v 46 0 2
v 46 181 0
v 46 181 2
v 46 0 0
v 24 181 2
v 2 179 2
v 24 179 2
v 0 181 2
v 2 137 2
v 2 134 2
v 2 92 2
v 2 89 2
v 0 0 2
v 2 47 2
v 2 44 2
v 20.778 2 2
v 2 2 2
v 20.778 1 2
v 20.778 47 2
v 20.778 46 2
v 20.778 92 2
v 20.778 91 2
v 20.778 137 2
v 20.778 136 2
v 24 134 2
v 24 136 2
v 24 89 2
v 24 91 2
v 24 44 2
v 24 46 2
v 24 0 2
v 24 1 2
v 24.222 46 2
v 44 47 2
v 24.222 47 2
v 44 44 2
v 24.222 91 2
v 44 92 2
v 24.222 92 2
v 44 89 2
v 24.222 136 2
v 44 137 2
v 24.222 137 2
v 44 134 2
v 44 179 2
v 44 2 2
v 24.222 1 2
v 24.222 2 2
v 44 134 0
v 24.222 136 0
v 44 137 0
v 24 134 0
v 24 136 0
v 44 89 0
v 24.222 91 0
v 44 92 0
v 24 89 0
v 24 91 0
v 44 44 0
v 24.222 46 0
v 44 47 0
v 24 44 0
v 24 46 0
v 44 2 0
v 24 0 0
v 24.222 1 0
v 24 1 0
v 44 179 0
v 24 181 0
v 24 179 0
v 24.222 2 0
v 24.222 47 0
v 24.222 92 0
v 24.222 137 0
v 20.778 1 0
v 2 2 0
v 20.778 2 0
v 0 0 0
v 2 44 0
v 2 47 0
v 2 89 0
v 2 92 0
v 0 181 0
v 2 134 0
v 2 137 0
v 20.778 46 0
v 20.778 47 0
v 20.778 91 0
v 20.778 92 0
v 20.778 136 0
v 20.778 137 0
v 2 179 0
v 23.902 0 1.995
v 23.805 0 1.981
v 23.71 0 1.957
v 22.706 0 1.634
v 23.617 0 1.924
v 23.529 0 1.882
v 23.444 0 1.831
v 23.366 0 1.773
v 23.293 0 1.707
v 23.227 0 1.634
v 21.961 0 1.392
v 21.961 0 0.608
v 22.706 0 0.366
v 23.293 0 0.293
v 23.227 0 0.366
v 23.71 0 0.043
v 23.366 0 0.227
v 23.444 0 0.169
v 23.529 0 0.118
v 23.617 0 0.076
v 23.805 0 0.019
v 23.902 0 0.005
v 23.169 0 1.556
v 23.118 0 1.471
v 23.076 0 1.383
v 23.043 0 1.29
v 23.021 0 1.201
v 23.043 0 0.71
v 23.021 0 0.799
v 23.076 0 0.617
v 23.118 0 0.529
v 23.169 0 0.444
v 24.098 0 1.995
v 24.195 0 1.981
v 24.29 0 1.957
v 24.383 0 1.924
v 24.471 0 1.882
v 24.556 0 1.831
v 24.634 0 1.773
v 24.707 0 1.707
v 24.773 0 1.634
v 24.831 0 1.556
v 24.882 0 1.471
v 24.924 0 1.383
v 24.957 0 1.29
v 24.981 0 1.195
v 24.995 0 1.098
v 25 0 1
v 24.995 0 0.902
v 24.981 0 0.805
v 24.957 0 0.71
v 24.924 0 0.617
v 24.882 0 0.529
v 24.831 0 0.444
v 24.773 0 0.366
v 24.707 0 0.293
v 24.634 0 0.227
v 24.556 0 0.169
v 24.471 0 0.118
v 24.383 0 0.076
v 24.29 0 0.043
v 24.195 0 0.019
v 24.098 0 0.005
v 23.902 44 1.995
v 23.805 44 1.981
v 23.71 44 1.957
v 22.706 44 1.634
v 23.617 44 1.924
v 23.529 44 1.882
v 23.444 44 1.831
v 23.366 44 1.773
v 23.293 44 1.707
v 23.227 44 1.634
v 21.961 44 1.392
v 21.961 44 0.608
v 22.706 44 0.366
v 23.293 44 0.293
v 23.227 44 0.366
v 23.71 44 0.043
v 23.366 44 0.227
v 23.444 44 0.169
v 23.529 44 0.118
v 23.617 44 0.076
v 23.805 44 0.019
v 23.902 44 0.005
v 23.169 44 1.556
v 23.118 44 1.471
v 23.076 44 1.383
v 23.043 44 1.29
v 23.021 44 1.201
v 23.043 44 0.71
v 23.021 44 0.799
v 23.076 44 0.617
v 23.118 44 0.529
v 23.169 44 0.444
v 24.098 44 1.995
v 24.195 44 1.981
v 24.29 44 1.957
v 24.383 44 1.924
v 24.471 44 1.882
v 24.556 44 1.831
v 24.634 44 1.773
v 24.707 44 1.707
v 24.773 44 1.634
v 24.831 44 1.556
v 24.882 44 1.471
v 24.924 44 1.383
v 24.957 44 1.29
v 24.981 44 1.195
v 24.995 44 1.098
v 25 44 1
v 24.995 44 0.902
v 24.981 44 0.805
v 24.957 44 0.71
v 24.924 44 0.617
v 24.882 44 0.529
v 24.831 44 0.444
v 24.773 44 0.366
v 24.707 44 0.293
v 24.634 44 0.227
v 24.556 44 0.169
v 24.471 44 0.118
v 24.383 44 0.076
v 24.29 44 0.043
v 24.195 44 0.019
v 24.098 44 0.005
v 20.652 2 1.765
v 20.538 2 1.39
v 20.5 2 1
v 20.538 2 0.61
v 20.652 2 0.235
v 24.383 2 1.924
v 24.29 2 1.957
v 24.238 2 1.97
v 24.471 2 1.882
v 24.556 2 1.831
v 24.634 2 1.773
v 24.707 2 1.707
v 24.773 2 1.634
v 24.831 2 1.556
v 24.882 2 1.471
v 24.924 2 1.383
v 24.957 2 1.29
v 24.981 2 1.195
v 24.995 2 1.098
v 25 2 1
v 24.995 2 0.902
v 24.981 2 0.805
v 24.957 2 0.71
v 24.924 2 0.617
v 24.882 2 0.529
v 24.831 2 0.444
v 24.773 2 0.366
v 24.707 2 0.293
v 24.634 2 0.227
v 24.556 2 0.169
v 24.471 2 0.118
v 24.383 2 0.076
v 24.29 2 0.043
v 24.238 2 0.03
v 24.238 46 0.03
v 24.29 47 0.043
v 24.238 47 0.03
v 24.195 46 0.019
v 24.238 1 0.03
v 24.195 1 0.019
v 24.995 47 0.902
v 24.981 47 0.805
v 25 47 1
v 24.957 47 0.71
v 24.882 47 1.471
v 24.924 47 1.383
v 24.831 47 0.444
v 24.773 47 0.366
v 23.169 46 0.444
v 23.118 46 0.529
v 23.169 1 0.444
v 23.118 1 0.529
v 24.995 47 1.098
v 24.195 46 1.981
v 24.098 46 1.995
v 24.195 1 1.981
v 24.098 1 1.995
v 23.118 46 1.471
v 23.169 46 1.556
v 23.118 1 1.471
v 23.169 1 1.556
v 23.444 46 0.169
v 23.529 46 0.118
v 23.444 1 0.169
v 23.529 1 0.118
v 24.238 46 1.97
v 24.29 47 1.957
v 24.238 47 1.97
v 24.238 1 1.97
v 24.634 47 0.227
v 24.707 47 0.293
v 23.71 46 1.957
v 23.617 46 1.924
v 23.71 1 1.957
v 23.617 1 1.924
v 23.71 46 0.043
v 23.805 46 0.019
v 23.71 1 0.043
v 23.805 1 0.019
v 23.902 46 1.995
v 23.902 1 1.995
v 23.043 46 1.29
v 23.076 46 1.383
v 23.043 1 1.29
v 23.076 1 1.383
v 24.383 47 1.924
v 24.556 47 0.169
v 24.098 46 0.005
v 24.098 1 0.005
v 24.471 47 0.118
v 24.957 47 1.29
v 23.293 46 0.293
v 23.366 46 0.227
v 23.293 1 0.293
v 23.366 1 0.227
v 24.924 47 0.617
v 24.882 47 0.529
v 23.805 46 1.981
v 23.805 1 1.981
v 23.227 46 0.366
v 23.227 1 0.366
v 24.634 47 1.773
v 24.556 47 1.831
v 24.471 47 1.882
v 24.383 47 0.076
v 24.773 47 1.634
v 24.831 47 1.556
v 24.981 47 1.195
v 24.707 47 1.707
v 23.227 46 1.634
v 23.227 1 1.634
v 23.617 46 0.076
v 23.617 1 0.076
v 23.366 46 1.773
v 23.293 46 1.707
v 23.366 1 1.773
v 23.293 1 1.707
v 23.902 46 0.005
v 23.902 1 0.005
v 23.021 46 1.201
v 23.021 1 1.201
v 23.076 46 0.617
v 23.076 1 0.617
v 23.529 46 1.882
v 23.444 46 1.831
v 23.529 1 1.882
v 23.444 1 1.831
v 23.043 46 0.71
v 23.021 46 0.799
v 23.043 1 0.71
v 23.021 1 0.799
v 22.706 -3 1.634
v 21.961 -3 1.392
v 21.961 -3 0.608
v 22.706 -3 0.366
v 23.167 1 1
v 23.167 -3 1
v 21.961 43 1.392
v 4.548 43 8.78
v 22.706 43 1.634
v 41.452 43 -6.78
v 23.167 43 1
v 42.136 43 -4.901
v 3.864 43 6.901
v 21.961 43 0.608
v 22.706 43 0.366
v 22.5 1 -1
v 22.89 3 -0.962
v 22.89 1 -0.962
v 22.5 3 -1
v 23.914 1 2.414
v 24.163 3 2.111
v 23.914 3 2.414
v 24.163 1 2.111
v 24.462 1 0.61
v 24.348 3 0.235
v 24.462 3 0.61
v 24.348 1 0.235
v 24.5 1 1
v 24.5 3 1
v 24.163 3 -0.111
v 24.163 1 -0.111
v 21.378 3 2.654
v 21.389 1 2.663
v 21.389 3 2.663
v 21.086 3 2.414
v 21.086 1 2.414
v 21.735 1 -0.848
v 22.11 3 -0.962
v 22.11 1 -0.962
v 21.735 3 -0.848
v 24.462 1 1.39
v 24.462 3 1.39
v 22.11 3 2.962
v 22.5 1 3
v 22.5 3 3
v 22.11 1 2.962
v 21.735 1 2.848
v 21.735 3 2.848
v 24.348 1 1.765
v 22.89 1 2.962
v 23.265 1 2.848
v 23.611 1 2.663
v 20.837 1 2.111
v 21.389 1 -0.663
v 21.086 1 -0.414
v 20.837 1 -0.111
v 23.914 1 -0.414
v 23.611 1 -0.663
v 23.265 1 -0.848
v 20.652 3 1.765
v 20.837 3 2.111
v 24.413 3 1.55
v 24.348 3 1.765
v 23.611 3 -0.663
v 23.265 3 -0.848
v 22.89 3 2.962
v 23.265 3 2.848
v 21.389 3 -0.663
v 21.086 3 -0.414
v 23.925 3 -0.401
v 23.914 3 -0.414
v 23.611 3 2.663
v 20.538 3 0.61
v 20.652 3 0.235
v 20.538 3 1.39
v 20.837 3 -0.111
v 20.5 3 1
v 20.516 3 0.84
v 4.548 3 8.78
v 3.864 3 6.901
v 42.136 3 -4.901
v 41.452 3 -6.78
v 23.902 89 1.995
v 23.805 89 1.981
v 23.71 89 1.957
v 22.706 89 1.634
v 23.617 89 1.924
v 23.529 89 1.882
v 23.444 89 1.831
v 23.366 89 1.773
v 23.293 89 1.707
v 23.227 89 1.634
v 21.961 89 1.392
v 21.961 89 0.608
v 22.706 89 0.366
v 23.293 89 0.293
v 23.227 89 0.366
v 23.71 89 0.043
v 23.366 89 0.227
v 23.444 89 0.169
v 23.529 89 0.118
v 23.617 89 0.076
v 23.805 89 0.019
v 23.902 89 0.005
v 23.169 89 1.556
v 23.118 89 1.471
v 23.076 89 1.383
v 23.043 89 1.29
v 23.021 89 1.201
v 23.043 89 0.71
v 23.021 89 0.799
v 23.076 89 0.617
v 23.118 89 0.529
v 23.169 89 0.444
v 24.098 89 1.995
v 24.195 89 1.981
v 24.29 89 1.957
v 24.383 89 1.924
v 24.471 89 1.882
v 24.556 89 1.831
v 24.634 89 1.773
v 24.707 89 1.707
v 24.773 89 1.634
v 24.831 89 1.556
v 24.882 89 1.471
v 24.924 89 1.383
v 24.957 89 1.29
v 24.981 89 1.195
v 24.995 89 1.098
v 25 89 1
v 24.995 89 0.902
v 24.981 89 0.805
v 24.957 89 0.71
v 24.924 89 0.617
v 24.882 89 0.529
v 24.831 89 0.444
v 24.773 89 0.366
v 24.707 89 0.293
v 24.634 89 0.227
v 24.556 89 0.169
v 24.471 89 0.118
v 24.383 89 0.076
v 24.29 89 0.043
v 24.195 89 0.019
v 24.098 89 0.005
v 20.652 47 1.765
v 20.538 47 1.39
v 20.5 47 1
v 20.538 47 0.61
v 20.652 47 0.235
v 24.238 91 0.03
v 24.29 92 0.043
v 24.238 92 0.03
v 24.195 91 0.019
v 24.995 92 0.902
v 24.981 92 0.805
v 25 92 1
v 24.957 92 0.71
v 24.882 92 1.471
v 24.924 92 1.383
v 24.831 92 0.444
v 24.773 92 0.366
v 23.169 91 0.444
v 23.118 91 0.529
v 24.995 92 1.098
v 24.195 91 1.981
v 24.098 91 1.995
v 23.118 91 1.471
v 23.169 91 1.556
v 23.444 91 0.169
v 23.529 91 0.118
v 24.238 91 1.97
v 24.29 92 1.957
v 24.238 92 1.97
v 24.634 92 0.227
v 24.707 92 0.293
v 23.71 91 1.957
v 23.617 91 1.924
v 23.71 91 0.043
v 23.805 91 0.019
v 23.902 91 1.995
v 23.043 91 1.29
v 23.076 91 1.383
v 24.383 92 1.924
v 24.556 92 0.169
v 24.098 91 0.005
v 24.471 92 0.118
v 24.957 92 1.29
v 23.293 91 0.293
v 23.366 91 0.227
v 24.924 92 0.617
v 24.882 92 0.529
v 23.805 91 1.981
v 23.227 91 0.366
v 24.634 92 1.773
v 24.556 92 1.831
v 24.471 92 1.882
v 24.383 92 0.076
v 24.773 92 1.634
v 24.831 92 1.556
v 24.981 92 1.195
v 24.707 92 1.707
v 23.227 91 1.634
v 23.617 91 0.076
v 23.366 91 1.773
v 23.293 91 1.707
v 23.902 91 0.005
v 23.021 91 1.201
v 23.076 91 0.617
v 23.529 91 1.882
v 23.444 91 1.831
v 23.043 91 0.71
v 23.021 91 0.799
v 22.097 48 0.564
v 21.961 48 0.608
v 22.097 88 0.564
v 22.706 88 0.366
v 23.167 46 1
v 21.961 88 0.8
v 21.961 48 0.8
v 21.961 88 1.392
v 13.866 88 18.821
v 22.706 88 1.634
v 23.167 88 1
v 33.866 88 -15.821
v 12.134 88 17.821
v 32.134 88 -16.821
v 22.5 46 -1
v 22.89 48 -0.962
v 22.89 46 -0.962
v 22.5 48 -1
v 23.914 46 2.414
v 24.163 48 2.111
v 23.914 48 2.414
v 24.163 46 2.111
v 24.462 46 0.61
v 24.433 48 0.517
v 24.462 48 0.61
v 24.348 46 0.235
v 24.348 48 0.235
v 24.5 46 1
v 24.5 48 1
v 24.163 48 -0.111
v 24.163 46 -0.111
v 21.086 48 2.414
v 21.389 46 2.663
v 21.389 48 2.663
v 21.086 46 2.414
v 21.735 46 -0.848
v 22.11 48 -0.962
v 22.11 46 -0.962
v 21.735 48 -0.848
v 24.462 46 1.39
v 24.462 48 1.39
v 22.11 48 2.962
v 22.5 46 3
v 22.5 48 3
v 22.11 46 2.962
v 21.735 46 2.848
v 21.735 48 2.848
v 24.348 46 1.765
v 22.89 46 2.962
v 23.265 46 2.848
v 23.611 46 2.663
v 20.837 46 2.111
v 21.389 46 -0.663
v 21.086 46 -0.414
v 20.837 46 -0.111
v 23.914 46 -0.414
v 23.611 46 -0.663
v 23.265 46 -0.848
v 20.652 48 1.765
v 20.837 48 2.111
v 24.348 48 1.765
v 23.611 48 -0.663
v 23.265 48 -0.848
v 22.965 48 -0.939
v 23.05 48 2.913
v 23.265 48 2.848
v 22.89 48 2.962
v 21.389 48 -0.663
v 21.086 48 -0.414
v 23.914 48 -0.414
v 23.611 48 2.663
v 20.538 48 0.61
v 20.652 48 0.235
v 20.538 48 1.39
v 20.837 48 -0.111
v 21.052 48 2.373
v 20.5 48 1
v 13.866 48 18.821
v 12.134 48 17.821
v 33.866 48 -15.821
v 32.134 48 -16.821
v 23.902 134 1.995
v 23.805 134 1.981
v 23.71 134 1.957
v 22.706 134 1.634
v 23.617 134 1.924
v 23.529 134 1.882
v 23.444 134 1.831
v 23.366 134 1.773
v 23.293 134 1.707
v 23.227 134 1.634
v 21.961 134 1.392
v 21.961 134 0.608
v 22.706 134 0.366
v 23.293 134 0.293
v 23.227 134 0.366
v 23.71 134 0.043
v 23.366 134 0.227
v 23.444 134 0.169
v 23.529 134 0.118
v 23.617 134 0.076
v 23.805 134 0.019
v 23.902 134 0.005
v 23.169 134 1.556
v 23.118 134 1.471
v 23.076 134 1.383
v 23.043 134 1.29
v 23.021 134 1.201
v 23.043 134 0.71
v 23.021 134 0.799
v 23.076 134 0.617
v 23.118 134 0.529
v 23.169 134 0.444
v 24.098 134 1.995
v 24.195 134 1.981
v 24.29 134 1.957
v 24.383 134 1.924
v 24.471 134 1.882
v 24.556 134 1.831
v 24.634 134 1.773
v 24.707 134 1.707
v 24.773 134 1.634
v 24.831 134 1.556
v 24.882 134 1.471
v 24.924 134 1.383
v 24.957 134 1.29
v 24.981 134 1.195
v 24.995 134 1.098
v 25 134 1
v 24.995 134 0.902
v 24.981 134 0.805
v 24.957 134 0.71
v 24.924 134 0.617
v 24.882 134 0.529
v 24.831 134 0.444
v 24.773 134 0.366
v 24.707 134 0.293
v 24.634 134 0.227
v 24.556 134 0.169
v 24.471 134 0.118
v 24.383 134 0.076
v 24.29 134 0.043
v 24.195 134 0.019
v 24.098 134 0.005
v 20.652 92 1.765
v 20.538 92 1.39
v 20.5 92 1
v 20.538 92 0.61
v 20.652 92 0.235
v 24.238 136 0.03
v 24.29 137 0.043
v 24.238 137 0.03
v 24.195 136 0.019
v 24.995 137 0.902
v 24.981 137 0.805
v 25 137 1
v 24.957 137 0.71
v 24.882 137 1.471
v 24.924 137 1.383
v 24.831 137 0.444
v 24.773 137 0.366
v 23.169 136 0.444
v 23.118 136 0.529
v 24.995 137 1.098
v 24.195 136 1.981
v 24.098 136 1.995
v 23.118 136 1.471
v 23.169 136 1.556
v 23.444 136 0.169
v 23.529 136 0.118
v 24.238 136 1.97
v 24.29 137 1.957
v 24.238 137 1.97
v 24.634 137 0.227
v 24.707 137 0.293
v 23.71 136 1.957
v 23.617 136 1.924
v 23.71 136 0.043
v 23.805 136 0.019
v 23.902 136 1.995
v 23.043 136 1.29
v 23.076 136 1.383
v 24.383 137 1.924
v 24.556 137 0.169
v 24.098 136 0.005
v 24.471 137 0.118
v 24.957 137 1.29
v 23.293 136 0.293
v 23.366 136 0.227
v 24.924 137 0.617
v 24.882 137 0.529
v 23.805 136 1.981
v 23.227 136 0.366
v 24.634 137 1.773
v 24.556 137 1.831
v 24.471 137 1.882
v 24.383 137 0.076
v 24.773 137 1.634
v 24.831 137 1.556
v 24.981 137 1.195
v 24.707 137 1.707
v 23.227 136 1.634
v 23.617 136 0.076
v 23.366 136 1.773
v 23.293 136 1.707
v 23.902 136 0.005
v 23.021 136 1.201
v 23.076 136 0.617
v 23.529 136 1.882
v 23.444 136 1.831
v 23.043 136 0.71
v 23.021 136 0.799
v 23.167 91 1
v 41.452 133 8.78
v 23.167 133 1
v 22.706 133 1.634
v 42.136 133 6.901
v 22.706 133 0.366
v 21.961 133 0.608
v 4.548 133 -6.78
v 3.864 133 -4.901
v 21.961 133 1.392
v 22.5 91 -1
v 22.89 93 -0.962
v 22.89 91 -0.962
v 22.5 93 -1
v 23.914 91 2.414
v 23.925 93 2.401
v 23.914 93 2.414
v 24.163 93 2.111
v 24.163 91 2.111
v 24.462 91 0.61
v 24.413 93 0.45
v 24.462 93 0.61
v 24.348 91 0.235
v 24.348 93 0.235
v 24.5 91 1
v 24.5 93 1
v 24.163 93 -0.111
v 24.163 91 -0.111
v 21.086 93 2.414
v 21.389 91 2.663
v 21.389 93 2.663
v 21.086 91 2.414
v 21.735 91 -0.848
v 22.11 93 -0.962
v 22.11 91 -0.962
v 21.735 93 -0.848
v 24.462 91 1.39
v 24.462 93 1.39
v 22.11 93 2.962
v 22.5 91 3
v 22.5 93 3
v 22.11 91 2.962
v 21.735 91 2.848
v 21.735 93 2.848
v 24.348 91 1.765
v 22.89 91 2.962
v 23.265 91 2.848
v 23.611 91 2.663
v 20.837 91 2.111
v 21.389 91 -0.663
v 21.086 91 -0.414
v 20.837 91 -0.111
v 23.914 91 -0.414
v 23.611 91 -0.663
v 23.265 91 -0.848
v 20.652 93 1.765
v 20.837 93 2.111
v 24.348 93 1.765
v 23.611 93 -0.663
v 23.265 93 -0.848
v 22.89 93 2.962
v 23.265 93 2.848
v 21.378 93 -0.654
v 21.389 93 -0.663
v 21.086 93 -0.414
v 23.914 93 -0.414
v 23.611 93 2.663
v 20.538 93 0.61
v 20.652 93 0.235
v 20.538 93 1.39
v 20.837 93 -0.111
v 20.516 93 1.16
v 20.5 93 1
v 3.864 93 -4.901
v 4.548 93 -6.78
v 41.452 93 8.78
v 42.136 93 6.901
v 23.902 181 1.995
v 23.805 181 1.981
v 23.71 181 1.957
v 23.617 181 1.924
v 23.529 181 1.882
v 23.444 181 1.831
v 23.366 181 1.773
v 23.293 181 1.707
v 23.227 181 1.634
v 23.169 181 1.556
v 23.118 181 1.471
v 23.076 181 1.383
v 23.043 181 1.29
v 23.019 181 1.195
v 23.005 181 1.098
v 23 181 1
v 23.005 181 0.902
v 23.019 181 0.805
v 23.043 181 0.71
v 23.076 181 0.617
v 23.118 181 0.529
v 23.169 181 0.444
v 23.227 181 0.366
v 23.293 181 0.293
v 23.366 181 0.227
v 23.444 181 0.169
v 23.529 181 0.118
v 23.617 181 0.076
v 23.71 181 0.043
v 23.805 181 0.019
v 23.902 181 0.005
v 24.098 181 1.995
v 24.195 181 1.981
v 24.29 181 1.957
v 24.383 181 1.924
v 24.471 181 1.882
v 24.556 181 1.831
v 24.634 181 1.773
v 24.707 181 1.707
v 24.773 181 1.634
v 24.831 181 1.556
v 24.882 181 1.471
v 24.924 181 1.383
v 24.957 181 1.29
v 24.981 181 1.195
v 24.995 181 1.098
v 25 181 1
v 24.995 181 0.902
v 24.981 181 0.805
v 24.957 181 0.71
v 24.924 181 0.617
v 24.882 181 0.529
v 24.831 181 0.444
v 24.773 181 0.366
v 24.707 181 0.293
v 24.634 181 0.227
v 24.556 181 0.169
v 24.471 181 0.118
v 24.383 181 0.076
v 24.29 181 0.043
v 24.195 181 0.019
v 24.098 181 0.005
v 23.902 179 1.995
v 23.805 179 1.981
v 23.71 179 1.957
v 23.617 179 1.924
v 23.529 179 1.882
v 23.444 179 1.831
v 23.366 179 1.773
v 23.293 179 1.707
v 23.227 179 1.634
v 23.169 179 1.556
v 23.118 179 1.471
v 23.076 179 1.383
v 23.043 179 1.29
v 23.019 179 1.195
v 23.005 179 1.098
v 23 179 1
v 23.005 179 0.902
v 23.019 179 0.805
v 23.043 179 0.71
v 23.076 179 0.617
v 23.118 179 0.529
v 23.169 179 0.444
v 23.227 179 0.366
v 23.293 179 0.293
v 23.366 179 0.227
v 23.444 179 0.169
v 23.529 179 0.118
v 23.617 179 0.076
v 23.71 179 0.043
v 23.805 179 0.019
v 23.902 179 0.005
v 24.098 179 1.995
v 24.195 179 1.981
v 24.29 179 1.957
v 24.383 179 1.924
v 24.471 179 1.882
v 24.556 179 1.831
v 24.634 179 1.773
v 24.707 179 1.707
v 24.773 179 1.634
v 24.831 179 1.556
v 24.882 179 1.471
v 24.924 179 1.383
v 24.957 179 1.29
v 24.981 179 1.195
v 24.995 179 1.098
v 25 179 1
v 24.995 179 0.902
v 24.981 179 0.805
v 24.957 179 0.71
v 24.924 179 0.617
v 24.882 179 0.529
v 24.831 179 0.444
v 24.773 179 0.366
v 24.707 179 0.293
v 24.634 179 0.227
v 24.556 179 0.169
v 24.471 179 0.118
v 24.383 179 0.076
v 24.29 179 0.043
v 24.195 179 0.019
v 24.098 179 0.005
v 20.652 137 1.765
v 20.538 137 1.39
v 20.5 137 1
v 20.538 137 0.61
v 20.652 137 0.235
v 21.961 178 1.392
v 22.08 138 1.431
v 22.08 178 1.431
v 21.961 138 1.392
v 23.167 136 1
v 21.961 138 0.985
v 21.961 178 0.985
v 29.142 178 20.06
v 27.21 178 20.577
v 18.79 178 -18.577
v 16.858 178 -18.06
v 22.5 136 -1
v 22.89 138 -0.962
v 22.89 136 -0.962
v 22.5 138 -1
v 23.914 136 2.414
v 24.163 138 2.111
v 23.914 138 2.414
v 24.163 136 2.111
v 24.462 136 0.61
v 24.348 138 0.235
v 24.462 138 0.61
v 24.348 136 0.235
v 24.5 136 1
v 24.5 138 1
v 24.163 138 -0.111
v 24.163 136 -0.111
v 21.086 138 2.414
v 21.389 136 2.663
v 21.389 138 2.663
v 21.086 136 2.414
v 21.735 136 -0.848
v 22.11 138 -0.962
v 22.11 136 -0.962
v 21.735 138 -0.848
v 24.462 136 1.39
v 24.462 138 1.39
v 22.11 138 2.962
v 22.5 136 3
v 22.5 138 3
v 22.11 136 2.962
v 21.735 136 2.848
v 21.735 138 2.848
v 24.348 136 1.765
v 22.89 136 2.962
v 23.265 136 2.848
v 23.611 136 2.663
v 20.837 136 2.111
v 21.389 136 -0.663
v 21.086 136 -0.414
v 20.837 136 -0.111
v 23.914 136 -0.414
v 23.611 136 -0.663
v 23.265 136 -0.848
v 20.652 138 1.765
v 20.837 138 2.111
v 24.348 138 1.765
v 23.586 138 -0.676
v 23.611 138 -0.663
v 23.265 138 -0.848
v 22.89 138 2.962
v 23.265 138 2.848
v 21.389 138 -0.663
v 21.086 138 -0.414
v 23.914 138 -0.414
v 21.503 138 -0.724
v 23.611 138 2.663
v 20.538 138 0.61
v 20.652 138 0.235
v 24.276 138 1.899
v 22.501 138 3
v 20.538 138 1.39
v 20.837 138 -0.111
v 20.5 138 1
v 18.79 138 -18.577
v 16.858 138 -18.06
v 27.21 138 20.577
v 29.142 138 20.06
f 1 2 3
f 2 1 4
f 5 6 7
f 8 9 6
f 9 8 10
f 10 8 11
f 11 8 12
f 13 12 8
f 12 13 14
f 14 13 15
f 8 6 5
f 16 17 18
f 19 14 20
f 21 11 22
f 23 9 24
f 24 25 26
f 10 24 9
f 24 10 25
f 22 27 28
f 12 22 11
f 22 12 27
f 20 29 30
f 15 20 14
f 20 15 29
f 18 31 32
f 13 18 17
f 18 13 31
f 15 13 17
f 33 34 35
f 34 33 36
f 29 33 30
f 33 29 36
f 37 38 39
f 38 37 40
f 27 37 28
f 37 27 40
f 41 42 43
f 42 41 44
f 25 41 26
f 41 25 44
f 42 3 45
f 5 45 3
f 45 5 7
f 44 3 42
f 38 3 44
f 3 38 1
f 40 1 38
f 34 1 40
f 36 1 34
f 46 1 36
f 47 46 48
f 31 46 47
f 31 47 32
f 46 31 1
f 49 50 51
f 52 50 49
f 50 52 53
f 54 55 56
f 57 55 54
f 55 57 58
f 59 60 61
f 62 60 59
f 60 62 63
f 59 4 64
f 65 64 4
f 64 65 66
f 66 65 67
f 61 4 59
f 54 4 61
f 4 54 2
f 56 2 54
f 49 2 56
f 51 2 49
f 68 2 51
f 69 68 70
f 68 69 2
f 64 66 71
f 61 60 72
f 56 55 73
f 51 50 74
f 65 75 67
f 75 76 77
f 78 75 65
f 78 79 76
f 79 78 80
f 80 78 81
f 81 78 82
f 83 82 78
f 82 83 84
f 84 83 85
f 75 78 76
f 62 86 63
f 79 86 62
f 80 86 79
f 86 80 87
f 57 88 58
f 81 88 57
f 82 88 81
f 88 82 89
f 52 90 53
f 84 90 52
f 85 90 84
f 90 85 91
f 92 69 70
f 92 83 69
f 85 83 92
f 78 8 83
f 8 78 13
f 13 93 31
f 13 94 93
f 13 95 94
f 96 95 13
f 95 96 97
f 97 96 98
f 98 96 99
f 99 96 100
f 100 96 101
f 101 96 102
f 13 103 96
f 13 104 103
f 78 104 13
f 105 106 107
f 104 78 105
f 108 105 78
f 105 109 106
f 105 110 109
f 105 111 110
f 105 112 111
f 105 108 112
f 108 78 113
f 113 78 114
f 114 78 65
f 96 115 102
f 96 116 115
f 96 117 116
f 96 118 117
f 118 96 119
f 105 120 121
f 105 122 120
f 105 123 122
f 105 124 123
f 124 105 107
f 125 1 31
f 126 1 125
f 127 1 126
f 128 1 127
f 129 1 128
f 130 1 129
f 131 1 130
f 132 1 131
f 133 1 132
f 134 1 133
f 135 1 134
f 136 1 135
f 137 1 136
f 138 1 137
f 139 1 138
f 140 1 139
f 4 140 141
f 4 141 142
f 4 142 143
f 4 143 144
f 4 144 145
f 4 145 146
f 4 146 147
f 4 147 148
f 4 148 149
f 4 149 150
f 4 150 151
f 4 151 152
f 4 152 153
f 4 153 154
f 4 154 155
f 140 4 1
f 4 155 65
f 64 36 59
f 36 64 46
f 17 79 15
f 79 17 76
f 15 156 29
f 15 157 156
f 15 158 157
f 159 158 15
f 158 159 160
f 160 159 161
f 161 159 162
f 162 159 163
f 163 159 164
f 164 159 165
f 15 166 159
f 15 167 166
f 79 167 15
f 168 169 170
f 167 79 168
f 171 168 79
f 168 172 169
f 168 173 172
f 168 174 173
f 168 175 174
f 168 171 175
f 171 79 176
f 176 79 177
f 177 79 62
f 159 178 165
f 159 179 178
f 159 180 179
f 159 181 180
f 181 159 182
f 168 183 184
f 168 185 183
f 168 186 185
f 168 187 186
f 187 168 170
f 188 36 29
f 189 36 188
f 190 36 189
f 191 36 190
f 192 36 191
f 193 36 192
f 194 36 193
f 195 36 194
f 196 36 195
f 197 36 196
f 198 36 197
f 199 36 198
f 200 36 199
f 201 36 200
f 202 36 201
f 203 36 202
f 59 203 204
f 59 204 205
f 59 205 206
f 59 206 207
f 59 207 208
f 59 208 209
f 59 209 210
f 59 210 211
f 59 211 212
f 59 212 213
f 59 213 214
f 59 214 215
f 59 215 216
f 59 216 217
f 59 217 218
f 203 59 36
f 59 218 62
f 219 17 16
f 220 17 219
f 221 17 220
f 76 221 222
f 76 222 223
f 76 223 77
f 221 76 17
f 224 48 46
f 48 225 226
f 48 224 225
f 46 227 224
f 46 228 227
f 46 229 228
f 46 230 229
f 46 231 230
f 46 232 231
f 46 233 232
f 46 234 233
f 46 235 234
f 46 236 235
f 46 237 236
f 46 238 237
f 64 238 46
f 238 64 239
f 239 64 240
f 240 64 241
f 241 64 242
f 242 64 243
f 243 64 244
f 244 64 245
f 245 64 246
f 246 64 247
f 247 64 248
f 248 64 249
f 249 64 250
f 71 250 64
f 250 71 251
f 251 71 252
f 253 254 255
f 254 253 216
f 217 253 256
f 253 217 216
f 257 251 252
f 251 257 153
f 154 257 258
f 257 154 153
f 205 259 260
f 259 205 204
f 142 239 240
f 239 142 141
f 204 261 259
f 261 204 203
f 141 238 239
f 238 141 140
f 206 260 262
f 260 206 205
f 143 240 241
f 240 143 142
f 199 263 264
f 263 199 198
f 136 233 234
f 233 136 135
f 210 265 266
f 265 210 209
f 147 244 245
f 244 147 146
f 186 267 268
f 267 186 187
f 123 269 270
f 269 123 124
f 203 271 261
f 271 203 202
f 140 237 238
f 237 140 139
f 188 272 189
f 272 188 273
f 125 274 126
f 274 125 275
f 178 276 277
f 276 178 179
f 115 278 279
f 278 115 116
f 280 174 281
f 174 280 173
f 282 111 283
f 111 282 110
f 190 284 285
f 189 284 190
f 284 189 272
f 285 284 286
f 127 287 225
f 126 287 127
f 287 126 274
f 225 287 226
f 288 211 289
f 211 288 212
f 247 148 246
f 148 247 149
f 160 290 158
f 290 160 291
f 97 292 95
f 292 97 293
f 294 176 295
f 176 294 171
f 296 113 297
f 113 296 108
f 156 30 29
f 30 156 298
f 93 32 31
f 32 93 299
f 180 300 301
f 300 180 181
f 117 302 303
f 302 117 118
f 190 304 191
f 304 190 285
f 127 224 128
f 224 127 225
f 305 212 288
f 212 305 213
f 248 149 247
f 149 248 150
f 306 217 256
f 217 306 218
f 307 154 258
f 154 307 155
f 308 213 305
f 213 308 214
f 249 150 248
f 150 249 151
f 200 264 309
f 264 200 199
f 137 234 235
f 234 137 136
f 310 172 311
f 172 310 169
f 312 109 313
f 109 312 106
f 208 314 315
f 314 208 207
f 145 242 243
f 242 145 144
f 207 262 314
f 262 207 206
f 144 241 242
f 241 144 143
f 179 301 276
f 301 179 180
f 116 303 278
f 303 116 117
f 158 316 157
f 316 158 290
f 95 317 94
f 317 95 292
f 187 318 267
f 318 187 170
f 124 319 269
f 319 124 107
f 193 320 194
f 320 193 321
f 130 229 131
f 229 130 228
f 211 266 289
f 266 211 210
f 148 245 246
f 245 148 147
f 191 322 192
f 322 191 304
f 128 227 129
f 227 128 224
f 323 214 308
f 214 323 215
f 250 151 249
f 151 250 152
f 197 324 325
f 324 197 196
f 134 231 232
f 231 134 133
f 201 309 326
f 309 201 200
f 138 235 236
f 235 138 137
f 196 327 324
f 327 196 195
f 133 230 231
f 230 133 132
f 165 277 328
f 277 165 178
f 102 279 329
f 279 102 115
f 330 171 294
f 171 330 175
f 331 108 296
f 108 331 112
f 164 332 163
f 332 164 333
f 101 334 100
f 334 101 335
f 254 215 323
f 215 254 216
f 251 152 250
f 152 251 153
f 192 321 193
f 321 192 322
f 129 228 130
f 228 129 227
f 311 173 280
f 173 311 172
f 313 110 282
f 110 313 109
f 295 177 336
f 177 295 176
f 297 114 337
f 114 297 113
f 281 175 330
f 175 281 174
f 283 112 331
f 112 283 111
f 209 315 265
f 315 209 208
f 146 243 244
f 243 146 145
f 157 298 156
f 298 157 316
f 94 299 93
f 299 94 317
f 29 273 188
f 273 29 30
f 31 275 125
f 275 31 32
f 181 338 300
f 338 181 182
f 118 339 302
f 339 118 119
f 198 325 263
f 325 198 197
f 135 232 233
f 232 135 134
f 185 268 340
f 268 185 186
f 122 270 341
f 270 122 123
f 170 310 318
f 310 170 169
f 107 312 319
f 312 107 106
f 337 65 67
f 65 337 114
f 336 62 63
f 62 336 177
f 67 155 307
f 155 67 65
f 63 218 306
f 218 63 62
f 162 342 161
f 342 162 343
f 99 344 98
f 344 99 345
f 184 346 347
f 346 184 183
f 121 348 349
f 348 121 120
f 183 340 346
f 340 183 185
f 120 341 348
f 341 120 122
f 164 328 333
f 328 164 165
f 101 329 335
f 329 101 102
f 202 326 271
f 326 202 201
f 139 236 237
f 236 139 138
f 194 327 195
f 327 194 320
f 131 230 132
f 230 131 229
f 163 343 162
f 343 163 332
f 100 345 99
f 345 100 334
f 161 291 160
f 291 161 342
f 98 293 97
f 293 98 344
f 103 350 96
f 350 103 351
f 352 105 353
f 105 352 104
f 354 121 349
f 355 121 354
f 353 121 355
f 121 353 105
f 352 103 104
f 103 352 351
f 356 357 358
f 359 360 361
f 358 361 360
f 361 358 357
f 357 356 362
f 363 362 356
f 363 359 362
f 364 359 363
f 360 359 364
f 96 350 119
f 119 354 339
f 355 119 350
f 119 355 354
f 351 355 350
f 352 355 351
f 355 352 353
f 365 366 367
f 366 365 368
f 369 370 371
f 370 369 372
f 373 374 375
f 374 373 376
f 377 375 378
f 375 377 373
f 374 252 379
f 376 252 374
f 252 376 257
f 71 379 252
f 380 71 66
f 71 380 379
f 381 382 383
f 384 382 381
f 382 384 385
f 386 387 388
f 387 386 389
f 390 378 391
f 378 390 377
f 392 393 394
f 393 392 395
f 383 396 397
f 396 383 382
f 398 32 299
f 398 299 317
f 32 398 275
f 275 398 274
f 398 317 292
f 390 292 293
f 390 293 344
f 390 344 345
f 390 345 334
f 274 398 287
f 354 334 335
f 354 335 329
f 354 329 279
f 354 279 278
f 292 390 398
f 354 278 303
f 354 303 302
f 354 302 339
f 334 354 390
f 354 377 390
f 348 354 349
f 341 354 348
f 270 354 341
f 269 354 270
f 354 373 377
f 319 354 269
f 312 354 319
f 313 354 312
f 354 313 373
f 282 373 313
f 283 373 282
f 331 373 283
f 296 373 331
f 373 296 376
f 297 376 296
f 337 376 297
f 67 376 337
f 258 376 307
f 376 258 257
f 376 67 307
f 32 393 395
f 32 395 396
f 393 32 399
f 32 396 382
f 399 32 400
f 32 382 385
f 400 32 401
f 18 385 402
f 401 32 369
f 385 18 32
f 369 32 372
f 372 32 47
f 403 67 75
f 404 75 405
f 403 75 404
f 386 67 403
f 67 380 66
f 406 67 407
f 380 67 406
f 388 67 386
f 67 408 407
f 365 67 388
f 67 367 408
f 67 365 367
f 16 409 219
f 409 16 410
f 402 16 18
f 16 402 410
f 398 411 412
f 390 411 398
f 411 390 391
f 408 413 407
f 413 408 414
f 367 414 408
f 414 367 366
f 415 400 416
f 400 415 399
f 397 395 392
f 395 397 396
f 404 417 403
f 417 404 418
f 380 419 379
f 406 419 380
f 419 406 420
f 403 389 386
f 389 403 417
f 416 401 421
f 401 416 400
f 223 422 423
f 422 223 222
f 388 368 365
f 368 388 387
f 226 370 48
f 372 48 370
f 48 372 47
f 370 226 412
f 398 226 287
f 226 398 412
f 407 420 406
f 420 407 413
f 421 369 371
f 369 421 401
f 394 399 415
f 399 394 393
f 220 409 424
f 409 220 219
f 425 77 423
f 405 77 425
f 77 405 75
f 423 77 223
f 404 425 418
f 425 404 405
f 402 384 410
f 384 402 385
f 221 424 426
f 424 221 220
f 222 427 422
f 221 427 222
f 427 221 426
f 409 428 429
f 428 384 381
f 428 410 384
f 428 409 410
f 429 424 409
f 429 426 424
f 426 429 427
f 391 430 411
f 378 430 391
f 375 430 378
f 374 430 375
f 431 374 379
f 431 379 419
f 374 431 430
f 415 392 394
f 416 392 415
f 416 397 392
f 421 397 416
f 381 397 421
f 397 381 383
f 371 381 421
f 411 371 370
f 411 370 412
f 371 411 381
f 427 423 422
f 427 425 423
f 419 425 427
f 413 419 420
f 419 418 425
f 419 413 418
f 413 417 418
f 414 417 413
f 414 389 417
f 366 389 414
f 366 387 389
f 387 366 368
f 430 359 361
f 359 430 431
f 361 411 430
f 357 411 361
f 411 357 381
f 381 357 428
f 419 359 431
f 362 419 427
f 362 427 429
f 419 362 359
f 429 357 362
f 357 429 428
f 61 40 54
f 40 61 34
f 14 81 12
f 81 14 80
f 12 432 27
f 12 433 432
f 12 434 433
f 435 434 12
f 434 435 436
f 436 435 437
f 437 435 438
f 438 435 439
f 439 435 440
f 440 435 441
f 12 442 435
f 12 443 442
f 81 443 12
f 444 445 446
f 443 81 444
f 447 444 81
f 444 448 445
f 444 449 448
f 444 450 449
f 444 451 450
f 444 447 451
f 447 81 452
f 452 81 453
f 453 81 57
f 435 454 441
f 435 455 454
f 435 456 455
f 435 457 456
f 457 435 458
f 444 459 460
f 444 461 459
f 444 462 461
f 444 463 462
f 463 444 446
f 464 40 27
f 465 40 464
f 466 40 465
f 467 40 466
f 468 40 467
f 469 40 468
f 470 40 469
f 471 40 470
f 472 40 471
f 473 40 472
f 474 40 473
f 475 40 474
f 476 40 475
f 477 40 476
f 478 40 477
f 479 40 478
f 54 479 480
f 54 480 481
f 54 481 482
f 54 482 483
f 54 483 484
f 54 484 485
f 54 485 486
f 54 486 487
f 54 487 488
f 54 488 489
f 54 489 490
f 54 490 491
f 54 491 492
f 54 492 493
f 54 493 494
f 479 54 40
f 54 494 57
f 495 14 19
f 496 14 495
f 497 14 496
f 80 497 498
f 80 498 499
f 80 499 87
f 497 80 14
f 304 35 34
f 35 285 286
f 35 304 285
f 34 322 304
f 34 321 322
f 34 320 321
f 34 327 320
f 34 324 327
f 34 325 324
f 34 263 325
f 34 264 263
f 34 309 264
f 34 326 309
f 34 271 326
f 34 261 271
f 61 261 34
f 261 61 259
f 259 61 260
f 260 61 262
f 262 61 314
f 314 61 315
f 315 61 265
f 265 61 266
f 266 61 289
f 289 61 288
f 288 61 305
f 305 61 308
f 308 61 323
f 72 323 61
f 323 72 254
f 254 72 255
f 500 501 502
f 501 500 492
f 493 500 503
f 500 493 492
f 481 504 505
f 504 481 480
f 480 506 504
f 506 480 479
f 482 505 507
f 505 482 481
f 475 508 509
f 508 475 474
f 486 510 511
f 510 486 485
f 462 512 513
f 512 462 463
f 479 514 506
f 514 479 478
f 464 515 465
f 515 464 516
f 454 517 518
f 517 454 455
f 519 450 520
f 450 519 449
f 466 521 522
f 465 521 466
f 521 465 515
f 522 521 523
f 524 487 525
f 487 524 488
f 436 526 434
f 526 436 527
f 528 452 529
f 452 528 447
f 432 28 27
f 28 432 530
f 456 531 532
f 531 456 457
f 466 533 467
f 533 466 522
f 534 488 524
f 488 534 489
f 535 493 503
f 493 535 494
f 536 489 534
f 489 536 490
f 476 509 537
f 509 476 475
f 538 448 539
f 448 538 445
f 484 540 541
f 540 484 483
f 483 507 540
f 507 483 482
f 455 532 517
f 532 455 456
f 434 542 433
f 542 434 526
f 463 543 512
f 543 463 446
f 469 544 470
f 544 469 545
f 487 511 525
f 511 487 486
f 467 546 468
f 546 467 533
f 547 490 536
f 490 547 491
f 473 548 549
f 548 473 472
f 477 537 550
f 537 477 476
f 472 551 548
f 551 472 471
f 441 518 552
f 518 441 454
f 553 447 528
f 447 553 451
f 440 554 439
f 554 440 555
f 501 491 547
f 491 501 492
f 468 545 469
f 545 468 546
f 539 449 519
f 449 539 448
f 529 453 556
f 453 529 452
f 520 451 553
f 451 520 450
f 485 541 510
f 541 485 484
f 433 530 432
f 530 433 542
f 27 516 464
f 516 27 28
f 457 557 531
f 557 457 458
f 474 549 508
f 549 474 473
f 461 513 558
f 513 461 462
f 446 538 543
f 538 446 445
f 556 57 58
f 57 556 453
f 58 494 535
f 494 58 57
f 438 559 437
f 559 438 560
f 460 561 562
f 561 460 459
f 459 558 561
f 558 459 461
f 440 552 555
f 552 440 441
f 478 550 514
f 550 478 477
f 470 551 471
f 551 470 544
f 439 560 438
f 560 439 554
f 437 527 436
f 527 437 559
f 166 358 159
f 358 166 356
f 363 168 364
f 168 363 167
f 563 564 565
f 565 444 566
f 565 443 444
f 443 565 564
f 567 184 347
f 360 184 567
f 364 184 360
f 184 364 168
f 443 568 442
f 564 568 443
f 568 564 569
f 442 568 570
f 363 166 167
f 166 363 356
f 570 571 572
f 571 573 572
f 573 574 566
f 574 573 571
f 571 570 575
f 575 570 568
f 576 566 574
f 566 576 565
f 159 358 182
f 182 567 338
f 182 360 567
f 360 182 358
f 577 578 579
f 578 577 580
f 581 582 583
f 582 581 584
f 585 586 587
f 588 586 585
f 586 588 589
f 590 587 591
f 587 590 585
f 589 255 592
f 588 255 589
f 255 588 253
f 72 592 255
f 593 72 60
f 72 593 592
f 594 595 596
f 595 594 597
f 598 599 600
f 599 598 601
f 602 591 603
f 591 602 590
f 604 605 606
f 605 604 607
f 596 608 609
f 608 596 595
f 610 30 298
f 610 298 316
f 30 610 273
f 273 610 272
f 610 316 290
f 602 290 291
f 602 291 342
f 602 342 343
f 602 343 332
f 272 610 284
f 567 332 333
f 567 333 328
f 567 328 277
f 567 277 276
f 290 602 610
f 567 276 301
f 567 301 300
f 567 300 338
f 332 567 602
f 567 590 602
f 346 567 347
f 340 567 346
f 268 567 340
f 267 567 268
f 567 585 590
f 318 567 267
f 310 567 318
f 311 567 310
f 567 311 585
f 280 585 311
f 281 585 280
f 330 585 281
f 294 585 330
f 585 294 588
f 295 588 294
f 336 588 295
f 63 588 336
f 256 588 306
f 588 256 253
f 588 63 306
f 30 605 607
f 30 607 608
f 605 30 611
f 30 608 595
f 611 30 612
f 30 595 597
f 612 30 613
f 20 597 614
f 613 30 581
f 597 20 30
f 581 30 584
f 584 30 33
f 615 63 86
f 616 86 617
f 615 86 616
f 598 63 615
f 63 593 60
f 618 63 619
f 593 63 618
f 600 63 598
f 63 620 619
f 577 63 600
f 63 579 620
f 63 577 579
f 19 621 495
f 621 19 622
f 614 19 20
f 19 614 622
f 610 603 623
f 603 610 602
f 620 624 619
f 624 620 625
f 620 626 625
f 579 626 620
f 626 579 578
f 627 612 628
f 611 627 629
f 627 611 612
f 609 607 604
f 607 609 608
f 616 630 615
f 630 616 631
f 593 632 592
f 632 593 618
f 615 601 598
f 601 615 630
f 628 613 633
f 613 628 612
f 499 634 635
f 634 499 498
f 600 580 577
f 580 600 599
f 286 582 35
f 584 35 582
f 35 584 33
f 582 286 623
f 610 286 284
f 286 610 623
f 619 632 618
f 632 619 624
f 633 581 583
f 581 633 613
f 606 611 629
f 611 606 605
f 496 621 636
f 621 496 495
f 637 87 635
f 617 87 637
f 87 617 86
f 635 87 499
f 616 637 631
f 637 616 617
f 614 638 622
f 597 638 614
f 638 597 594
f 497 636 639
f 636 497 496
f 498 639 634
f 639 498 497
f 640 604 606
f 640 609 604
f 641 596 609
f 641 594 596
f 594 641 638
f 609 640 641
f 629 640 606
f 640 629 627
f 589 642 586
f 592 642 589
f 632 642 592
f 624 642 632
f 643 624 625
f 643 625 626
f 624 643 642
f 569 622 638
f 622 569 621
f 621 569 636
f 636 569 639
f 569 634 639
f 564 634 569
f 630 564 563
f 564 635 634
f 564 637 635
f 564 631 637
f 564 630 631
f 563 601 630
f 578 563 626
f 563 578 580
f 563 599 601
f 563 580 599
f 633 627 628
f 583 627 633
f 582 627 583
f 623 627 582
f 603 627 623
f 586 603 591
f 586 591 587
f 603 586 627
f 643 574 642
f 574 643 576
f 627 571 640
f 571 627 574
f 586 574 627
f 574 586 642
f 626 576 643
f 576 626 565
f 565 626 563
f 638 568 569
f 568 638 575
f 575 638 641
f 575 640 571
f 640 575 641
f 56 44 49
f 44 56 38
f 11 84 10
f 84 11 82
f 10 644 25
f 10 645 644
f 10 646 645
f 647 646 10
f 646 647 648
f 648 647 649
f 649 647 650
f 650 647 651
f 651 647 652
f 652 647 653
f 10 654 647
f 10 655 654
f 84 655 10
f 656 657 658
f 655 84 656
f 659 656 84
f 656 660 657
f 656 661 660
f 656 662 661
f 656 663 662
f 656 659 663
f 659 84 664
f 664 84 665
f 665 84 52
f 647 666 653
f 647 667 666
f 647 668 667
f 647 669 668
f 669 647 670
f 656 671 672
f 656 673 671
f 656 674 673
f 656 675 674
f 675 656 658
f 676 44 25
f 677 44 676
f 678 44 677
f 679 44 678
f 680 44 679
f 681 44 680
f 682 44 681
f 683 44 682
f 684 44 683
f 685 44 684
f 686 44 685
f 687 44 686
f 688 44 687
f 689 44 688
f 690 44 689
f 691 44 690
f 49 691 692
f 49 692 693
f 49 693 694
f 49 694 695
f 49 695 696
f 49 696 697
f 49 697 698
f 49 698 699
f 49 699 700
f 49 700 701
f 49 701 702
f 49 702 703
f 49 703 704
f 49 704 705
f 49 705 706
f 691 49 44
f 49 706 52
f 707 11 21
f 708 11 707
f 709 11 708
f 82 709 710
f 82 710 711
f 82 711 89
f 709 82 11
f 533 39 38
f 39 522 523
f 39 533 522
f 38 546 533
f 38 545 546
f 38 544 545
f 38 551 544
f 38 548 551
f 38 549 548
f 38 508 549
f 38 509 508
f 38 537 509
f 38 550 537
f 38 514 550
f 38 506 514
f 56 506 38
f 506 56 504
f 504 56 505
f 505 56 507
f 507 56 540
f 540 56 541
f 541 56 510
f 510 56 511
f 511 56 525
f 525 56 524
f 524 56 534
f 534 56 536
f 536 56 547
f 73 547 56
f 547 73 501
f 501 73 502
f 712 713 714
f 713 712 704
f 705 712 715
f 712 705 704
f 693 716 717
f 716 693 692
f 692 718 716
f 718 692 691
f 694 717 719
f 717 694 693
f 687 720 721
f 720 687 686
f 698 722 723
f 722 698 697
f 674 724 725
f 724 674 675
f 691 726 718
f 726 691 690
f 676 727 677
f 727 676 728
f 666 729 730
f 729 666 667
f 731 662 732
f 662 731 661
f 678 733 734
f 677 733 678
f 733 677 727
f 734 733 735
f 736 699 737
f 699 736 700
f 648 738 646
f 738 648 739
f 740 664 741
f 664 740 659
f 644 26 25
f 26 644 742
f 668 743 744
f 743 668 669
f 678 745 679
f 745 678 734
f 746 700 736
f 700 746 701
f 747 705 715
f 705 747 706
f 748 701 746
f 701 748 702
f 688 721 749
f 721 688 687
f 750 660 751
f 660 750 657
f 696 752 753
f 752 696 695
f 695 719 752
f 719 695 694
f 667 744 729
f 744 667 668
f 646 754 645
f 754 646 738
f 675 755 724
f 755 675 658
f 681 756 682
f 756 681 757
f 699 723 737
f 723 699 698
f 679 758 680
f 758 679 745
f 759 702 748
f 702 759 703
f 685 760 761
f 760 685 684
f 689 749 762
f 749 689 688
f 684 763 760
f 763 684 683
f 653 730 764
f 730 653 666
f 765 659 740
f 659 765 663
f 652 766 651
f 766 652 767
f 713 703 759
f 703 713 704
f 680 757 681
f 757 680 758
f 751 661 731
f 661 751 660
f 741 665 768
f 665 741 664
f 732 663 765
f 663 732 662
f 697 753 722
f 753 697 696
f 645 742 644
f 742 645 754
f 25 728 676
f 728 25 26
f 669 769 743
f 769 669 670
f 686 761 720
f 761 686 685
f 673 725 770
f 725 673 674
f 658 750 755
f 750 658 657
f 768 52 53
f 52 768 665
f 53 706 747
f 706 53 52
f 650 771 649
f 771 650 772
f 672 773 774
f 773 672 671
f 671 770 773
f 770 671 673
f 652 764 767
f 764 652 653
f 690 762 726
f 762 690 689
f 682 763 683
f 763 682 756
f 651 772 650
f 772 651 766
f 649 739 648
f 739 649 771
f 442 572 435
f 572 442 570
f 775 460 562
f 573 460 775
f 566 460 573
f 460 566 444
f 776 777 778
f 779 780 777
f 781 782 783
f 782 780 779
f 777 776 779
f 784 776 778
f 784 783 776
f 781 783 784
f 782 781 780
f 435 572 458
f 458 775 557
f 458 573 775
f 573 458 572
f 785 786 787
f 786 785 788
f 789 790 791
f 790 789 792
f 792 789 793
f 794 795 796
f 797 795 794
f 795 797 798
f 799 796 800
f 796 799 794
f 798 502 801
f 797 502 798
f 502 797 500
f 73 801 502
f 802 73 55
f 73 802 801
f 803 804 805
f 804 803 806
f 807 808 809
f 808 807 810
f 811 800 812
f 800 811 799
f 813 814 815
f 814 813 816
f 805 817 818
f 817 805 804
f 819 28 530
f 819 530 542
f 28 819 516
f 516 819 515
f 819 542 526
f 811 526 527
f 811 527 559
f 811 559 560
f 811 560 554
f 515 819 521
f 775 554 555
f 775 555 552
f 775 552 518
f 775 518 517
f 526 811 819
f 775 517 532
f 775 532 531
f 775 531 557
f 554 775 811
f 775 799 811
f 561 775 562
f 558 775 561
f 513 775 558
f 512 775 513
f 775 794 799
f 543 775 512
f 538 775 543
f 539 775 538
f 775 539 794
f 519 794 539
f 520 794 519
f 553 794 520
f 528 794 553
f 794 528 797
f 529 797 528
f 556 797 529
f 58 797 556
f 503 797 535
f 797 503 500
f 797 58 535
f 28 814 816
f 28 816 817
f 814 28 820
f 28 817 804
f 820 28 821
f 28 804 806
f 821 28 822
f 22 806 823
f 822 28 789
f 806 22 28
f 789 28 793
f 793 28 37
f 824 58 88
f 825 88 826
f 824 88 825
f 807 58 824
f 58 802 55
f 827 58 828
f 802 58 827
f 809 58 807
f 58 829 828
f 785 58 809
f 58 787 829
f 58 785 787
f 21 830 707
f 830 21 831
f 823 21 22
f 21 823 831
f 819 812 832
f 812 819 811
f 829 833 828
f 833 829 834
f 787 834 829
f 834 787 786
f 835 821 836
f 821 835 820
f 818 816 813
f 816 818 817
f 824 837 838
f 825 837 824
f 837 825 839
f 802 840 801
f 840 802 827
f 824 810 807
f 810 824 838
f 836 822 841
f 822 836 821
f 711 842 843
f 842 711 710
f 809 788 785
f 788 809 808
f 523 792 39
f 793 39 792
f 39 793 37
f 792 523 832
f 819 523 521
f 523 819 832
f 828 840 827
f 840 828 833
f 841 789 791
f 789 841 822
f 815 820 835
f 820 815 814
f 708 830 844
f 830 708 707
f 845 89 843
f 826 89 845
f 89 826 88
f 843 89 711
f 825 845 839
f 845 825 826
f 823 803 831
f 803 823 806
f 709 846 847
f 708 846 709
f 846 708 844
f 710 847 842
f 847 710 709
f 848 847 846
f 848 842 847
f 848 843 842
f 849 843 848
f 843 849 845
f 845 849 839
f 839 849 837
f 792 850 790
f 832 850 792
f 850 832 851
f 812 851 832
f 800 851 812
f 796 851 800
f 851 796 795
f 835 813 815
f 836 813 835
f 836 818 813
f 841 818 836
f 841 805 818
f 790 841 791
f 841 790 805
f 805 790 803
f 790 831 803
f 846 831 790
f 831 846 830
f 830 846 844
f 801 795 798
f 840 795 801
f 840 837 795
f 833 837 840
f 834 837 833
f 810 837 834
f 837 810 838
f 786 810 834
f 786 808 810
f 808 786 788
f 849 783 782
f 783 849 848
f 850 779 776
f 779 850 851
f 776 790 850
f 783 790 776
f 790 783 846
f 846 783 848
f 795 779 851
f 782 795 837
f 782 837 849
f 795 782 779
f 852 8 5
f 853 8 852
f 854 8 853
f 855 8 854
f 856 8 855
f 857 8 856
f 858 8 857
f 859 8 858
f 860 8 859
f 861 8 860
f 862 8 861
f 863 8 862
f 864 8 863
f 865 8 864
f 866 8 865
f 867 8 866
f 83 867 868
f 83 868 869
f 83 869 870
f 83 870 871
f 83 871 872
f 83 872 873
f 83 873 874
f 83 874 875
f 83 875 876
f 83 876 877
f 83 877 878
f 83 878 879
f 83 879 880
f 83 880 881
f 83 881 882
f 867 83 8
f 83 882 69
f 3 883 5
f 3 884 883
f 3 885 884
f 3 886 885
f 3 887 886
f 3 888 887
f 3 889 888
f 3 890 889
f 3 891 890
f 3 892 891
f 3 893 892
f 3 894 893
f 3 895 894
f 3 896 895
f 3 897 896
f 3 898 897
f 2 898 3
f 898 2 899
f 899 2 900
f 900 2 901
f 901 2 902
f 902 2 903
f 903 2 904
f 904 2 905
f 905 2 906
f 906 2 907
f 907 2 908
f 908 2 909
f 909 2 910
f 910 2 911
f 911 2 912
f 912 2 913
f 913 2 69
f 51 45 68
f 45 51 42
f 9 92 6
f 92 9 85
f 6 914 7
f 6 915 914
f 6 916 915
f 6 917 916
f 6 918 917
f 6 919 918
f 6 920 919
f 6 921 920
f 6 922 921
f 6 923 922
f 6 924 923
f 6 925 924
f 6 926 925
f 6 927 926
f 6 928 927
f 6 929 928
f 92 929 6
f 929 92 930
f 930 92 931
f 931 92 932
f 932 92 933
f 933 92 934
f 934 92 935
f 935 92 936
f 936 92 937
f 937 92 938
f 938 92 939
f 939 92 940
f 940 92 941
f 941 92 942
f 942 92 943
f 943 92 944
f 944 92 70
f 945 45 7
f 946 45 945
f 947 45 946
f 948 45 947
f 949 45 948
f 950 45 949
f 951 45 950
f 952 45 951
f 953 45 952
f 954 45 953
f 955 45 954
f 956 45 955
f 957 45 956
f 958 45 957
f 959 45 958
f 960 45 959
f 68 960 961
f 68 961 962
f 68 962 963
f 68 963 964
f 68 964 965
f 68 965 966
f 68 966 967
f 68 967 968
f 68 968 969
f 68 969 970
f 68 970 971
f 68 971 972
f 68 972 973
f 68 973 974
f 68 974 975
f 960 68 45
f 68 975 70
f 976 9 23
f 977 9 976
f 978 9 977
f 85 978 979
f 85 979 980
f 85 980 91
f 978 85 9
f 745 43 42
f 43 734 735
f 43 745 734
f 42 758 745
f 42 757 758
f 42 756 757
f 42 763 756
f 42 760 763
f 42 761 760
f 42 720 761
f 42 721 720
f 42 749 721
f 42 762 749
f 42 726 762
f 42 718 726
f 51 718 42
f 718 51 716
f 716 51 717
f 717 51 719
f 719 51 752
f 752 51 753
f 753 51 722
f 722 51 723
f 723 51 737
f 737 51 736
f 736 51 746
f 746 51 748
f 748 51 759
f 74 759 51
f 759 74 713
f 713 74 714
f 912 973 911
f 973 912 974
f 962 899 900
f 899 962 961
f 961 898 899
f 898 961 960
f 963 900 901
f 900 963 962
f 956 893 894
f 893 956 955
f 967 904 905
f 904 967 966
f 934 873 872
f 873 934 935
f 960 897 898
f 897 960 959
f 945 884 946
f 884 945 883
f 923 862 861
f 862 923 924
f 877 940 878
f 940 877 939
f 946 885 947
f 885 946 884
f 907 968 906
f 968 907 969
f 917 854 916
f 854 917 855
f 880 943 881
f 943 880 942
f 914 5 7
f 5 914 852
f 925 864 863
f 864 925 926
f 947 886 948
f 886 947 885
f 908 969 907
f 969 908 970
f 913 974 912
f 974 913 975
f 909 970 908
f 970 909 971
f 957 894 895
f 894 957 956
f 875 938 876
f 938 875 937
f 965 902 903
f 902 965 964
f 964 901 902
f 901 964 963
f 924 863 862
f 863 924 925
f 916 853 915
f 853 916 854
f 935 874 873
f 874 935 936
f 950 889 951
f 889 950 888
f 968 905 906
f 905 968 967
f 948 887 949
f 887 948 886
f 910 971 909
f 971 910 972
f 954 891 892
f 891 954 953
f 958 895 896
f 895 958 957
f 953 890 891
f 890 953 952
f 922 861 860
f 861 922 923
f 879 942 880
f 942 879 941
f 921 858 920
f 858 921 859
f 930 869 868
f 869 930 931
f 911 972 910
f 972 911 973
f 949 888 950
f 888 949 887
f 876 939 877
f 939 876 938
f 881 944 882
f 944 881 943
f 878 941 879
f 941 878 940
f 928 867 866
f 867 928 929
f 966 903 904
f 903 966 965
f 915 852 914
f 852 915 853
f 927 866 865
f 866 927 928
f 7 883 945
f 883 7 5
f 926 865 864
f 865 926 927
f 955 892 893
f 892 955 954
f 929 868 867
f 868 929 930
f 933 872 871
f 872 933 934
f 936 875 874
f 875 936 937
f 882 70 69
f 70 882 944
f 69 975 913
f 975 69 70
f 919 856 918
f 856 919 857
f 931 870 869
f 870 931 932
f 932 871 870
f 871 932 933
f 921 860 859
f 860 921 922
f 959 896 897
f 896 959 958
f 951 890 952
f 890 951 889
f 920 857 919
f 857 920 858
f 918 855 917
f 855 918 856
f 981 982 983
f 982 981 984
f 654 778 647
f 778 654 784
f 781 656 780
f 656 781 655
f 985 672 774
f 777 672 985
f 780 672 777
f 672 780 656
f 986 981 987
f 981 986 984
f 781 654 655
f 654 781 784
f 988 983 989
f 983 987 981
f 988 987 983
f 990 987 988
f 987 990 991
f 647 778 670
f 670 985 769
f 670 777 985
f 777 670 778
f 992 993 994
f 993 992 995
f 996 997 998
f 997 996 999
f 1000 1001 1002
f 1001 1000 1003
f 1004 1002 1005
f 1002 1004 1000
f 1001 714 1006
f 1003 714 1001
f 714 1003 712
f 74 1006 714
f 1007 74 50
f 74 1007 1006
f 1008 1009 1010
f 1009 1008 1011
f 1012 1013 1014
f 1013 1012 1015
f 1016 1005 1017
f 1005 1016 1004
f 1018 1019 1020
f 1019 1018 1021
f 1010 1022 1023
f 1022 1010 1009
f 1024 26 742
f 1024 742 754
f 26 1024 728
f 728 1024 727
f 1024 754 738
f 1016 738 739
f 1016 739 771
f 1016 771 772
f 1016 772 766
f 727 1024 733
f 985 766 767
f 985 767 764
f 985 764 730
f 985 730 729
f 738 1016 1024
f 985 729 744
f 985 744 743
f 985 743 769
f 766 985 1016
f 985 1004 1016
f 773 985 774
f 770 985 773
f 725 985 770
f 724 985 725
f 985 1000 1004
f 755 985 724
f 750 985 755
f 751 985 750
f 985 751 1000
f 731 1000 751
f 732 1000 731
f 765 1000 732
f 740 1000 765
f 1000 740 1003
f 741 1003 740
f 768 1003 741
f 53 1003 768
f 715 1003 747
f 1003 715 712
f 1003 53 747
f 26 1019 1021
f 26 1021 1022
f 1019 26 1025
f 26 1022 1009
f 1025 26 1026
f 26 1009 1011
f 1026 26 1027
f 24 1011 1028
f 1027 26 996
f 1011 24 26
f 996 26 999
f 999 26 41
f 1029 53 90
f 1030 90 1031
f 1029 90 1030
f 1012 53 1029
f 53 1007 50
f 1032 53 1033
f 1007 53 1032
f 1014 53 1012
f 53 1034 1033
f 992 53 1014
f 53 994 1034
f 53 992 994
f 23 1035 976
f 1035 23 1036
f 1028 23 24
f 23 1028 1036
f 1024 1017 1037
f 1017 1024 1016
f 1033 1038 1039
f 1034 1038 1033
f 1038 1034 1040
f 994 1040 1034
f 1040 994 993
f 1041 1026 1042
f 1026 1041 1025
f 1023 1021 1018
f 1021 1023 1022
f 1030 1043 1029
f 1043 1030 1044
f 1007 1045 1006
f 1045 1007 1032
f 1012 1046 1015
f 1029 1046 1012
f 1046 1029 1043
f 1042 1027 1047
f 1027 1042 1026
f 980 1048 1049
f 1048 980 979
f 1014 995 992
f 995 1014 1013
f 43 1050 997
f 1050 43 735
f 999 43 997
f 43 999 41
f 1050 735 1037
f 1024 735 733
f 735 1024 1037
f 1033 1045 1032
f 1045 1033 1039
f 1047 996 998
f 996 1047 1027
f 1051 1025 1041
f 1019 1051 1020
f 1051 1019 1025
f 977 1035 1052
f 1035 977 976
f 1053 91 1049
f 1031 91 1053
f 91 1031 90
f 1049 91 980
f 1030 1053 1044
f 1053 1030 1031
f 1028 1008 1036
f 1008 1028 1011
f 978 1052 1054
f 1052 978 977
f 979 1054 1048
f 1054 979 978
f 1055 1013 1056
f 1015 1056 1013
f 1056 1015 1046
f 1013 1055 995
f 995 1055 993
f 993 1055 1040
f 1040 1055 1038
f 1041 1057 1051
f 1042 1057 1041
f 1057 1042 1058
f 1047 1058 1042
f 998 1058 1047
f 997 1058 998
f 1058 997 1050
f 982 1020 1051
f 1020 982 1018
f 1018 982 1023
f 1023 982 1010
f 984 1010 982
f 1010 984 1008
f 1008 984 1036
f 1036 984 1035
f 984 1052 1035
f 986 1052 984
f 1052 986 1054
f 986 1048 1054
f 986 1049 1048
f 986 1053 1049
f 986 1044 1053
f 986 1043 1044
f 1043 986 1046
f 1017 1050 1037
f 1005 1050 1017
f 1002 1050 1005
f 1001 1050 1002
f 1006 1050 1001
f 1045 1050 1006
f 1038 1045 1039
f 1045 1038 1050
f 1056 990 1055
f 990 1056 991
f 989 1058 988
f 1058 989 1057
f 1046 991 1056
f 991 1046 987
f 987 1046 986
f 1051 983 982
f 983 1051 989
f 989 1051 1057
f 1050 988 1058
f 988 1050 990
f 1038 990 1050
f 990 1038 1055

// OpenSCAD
$mirror_side = 40;
$mirror_clearance = 2;
$mount_r = 1;

$rail_dim = 2;

$mirror_thick = 2;



module mirror_mount (hollow_side, rail_size, clearance) {
    
    $outer_size = hollow_side+clearance + 2*rail_size;
    $inner_size = hollow_side + clearance;    

    difference() {
        translate([0,0,0]) {
            cube([$outer_size,$outer_size,rail_size]);
        }
        translate([rail_size,rail_size,-1]) {
            cube([$inner_size,$inner_size,rail_size+2]);
        }
        rotate([-90,0,0]) {
            translate([(hollow_side+rail_size+clearance)/2+$mount_r*2,-rail_size/2,-1]) {
                cylinder(r=$mount_r, h=$outer_size+2, $fn=64);
            }
        }
    }
}

module rotateable_cube(x,y,z, xd, yd, zd) {
    translate([x/2,y/2,z/2]) {
        rotate([xd, yd, zd]) {
            cube([x, y, z], center=true);
        }
    }
}

module simulated_mirror (side, thick, rr, rail, clearance, rot) {
    union() {
        
        translate([0,0,-thick/2]) {
            rotateable_cube(side,side,thick, 0,rot,0);
        }
        
        rotate([-90,0,0]) {
            translate([(side-1)/2,0,-6]) {
                cylinder(r=$mount_r/1.5, h=side+2*rail+clearance); 
            }
            translate([(side-1)/2,0,-2]) {
                cylinder(r=$mount_r*2, h=2, $fn=32); 
            }
        }
    }    
}

module mirror_and_mount(degrees) {
    translate([0,0,0]) {
        mirror_mount($mirror_side, $rail_dim, $mirror_clearance);
    }
    
    $mirror_offset = $rail_dim+$mirror_clearance/2;
    translate([$mirror_offset,$mirror_offset,$rail_dim/2]) {
        simulated_mirror($mirror_side, $mirror_thick, $mount_r/1.5, $rail_dim, $mirror_clearance, degrees);
    }
}

mirror_and_mount(20);
translate([0,45,0]) {
    mirror_and_mount(60);    
}
translate([0,90,0]) {
    mirror_and_mount(-20);    
}
translate([0,135,0]) {
    mirror_and_mount(-75);    
}

    
